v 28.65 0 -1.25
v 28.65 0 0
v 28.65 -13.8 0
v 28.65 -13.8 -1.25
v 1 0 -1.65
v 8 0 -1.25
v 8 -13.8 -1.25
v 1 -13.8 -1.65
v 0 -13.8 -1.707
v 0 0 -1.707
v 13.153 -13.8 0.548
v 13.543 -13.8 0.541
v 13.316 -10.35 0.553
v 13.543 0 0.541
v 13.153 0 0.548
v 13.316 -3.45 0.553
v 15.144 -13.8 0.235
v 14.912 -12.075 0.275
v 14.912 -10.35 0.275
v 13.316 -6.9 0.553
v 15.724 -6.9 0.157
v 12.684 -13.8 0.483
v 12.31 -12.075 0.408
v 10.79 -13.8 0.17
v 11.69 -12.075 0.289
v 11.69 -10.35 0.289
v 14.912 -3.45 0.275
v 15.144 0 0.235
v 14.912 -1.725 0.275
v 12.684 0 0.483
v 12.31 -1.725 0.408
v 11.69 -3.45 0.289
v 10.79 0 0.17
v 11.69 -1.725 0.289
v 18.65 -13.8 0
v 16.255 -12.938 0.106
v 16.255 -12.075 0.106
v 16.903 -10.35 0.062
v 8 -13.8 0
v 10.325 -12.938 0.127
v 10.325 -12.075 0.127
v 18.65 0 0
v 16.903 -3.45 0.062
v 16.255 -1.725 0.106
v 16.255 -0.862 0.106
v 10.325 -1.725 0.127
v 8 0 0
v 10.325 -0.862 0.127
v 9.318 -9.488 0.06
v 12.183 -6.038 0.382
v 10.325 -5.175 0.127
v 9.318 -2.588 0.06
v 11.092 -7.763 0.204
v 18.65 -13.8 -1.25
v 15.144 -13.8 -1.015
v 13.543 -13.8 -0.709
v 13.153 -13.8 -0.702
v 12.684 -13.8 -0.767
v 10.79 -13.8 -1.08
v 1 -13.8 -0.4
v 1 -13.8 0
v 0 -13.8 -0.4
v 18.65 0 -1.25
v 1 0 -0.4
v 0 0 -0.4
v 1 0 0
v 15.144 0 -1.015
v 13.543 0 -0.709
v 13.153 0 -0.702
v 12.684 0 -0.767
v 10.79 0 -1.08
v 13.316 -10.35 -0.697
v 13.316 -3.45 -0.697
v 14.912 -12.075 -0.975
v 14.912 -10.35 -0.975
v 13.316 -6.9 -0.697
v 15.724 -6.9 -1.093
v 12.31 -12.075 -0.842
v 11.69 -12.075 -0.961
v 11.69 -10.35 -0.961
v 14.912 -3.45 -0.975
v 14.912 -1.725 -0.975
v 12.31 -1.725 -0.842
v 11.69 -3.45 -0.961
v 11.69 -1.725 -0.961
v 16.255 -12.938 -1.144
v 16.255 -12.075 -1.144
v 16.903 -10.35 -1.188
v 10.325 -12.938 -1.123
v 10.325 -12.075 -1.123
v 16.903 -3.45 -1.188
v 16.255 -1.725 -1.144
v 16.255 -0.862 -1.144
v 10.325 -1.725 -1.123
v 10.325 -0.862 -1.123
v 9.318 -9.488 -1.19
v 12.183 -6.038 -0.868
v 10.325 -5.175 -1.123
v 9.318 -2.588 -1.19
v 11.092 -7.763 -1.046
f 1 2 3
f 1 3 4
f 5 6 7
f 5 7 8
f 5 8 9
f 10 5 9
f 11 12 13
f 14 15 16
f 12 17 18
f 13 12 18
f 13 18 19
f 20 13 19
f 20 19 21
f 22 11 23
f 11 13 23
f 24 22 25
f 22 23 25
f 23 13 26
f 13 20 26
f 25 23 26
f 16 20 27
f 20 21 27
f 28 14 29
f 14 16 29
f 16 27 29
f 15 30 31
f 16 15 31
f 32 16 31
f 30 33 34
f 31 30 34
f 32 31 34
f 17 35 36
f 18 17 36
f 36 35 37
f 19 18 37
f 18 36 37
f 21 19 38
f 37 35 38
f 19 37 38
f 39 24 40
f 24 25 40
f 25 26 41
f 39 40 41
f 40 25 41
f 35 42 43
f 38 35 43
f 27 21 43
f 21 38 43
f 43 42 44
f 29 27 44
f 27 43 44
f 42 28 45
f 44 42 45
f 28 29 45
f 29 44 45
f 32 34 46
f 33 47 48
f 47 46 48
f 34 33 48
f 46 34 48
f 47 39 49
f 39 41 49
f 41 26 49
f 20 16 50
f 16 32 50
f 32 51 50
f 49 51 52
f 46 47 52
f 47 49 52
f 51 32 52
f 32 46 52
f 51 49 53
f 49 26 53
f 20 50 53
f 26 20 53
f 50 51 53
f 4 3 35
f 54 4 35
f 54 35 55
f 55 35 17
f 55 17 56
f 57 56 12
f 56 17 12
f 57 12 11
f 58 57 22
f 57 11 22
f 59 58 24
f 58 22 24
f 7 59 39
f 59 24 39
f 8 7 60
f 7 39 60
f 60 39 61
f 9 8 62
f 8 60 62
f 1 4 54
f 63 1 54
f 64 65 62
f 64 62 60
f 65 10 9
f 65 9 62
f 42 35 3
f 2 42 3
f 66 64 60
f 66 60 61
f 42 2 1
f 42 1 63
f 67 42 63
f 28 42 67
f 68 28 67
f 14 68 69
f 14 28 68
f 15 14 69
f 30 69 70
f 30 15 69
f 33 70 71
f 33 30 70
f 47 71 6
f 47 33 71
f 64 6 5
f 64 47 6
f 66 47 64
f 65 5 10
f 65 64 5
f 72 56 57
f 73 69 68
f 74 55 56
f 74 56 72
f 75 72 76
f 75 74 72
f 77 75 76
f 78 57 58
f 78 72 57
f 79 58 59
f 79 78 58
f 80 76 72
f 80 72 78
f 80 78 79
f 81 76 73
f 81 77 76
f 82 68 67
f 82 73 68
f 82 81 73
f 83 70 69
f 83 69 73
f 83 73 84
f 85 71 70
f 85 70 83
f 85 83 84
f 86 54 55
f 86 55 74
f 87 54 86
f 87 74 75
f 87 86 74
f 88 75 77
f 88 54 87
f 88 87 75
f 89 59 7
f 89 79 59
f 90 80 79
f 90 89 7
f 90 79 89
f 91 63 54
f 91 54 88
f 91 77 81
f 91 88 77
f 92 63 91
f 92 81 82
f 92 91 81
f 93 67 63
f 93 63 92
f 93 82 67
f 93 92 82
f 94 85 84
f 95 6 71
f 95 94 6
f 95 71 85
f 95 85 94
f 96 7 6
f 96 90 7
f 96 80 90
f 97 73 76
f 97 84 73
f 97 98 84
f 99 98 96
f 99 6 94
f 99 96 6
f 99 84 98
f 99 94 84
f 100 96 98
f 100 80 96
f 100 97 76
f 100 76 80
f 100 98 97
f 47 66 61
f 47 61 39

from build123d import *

# Parameters (mm, degrees)
PAD_DEPTH = 13.8


with BuildPart() as part:
    # Sketch → Pad (new body)
    with BuildSketch(Plane.XZ):
        with BuildLine():
            Line((1, -0.4), (1, 0))
            Line((1, 0), (8, 0))
            add(Edge.make_bspline(
                [(18.65, 0), (16.551038, 0.042752), (14.664511, 0.25382), (13.32, 0.7), (11.950524, 0.264498), (9.995746, 0.073969), (8, 0)],
                knots=[0, 0, 0, 0, 0.25, 0.5, 0.75, 1, 1, 1, 1], degree=3))
            Line((18.65, 0), (28.65, 0))
            Line((28.65, 0), (28.65, -1.25))
            Line((28.65, -1.25), (18.65, -1.25))
            add(Edge.make_bspline(
                [(18.65, -1.25), (16.551038, -1.207248), (14.664511, -0.99618), (13.32, -0.55), (11.950524, -0.985502), (9.995746, -1.176031), (8, -1.25)],
                knots=[0, 0, 0, 0, 0.25, 0.5, 0.75, 1, 1, 1, 1], degree=3))
            Line((8, -1.25), (1, -1.65))
            Line((1, -1.65), (0, -1.707143))
            Line((0, -1.707143), (0, -0.4))
            Line((0, -0.4), (1, -0.4))
        make_face()
    extrude(amount=PAD_DEPTH)


solid = part.part
